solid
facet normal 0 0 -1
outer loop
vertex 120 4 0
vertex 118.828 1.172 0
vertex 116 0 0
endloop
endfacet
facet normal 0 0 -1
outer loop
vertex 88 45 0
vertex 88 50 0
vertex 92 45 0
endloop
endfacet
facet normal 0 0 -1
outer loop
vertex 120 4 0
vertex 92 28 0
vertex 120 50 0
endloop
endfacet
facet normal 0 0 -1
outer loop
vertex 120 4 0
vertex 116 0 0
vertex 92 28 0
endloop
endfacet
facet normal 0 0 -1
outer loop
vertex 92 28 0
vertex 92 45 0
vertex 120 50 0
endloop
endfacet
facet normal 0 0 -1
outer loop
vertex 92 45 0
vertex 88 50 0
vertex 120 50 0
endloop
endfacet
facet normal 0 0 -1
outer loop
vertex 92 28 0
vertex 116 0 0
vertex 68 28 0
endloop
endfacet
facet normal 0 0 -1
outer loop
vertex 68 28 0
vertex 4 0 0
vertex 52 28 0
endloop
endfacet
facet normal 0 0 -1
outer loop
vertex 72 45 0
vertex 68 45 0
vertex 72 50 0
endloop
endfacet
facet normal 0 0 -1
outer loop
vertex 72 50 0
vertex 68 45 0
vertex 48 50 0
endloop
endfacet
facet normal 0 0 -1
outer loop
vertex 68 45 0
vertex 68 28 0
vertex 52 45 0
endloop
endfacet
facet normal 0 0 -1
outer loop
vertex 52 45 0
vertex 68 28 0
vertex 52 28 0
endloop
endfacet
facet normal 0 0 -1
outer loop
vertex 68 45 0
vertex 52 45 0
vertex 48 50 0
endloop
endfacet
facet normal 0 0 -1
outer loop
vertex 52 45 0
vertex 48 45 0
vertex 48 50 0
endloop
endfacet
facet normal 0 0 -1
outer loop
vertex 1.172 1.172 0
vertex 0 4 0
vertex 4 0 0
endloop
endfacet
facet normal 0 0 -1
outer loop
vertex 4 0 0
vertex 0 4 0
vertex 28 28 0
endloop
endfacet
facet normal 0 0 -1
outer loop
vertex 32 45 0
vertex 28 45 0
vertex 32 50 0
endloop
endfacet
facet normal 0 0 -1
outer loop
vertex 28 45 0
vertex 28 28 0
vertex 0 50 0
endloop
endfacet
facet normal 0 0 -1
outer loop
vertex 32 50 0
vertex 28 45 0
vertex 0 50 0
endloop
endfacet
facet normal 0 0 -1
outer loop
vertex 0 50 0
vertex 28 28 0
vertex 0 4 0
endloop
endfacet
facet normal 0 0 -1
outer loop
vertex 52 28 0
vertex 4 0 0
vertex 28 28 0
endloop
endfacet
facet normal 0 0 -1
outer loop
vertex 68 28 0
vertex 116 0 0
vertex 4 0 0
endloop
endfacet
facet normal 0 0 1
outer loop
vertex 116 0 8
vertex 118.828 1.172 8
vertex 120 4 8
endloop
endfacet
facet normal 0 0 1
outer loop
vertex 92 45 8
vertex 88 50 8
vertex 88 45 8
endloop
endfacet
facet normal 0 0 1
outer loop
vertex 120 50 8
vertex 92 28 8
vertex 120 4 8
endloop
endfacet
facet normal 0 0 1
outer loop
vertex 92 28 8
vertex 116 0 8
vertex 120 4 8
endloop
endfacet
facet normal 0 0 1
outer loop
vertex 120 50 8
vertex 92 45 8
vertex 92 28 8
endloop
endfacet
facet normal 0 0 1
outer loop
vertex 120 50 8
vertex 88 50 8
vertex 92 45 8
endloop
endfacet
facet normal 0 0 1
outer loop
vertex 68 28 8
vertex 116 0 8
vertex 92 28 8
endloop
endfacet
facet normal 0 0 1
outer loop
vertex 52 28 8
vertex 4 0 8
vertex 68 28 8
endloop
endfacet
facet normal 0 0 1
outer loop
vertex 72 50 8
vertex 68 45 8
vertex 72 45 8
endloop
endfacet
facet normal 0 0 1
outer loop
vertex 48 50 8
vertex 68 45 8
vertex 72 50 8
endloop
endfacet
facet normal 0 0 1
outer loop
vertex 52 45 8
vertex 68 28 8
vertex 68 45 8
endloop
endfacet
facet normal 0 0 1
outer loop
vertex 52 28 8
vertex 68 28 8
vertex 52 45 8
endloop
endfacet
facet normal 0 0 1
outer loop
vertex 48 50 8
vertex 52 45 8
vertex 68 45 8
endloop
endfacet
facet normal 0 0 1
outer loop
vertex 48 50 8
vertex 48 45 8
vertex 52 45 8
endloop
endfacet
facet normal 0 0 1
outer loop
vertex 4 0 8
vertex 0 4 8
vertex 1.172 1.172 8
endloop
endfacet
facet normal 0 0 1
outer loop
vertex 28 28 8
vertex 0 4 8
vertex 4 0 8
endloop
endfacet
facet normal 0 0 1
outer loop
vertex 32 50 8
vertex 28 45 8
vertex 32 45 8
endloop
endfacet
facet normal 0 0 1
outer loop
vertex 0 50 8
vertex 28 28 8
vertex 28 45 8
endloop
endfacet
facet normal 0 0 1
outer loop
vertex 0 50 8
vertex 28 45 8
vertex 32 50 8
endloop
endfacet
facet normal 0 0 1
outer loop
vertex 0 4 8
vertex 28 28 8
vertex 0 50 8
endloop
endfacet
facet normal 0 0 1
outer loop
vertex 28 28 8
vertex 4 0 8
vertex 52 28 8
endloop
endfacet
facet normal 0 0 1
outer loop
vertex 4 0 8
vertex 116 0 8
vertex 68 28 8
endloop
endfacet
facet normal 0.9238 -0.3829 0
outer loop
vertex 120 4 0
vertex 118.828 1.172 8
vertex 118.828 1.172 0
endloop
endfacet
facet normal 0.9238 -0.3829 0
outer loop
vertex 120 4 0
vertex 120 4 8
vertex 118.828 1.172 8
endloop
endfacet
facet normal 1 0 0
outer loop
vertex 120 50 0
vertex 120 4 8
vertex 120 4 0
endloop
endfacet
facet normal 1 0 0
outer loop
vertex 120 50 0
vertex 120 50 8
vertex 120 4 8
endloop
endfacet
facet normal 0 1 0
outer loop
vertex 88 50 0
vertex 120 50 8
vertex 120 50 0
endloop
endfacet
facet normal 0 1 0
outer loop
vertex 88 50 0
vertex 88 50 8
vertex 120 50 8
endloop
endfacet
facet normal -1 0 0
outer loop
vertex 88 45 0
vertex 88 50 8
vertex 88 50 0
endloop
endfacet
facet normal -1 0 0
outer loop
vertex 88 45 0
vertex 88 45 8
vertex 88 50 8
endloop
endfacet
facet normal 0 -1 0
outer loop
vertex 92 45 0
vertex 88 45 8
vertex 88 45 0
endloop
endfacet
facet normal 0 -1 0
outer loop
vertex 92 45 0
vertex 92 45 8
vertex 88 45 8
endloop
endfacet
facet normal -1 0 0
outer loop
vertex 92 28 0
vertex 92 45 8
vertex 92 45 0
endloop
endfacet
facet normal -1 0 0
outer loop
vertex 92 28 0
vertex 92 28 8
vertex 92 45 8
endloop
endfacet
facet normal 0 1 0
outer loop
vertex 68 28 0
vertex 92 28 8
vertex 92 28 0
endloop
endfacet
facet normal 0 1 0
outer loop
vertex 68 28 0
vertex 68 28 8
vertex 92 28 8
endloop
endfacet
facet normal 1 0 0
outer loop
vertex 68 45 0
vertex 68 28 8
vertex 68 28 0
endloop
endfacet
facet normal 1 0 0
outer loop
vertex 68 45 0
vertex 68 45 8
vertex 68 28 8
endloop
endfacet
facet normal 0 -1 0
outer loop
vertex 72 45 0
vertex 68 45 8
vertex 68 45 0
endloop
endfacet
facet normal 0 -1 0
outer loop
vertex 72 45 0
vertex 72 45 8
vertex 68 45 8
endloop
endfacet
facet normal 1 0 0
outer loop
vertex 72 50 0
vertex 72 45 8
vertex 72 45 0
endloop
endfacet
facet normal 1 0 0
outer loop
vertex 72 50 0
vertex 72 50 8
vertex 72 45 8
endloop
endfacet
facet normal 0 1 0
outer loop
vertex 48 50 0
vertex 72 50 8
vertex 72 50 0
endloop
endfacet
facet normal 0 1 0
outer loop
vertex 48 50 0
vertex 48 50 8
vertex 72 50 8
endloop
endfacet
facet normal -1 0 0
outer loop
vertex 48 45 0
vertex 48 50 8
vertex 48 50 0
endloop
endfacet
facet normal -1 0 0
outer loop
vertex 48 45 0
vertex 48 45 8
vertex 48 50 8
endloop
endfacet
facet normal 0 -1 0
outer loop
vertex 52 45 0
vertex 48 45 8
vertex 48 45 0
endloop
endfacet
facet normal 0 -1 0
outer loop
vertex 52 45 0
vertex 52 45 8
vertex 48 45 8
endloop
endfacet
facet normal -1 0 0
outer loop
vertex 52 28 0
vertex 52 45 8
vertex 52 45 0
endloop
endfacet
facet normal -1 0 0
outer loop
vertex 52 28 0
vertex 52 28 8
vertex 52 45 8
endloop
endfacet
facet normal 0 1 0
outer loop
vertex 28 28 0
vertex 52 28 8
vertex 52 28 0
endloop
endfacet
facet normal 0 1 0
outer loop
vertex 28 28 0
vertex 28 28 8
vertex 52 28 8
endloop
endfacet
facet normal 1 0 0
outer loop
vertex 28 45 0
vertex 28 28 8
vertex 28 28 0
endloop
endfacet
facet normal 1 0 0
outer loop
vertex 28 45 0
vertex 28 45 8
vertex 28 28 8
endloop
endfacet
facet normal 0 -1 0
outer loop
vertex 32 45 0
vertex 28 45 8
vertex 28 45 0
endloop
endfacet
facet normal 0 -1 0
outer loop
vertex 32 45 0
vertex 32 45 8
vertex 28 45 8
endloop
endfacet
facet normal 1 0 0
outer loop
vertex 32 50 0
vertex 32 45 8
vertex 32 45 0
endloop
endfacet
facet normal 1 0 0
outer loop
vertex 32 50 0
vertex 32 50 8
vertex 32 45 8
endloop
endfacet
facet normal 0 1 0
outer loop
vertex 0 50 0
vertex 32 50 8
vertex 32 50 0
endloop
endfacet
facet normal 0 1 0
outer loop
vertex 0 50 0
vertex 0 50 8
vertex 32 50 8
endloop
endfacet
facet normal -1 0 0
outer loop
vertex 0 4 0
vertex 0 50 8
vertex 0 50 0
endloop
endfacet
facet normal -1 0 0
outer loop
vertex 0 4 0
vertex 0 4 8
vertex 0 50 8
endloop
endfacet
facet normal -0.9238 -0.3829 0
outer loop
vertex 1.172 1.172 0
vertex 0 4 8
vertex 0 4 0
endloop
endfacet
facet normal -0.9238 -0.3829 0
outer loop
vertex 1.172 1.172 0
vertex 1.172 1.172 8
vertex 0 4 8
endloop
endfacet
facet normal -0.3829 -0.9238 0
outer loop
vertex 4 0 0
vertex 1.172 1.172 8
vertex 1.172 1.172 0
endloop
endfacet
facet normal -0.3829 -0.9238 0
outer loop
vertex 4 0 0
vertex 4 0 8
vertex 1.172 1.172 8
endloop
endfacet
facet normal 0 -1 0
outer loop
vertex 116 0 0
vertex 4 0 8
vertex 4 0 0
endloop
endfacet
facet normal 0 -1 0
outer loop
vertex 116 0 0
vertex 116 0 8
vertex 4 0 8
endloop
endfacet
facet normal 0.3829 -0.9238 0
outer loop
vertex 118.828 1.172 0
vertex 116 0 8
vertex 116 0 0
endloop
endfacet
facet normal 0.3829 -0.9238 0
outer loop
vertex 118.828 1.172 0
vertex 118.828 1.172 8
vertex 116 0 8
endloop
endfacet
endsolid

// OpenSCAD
$fn = 32;

// ----------------------------------------------------------------------
// Oversize slot bar: 120 mm bar with 2 oversize windows
// ----------------------------------------------------------------------

// --- parameters (mm) ---
profile_height = 8;       // extrusion height
profile_points = 24;      // points of the closed outline

profile = [[0, 4], [1.172, 1.172], [4, 0], [116, 0], [118.828, 1.172], [120, 4], [120, 50], [88, 50], [88, 45], [92, 45], [92, 28], [68, 28], [68, 45], [72, 45], [72, 50], [48, 50], [48, 45], [52, 45], [52, 28], [28, 28], [28, 45], [32, 45], [32, 50], [0, 50]];  // single closed polygon, 24 points, counter clockwise

// --- the one profile operation ---
linear_extrude(height = profile_height) polygon(points = profile);
